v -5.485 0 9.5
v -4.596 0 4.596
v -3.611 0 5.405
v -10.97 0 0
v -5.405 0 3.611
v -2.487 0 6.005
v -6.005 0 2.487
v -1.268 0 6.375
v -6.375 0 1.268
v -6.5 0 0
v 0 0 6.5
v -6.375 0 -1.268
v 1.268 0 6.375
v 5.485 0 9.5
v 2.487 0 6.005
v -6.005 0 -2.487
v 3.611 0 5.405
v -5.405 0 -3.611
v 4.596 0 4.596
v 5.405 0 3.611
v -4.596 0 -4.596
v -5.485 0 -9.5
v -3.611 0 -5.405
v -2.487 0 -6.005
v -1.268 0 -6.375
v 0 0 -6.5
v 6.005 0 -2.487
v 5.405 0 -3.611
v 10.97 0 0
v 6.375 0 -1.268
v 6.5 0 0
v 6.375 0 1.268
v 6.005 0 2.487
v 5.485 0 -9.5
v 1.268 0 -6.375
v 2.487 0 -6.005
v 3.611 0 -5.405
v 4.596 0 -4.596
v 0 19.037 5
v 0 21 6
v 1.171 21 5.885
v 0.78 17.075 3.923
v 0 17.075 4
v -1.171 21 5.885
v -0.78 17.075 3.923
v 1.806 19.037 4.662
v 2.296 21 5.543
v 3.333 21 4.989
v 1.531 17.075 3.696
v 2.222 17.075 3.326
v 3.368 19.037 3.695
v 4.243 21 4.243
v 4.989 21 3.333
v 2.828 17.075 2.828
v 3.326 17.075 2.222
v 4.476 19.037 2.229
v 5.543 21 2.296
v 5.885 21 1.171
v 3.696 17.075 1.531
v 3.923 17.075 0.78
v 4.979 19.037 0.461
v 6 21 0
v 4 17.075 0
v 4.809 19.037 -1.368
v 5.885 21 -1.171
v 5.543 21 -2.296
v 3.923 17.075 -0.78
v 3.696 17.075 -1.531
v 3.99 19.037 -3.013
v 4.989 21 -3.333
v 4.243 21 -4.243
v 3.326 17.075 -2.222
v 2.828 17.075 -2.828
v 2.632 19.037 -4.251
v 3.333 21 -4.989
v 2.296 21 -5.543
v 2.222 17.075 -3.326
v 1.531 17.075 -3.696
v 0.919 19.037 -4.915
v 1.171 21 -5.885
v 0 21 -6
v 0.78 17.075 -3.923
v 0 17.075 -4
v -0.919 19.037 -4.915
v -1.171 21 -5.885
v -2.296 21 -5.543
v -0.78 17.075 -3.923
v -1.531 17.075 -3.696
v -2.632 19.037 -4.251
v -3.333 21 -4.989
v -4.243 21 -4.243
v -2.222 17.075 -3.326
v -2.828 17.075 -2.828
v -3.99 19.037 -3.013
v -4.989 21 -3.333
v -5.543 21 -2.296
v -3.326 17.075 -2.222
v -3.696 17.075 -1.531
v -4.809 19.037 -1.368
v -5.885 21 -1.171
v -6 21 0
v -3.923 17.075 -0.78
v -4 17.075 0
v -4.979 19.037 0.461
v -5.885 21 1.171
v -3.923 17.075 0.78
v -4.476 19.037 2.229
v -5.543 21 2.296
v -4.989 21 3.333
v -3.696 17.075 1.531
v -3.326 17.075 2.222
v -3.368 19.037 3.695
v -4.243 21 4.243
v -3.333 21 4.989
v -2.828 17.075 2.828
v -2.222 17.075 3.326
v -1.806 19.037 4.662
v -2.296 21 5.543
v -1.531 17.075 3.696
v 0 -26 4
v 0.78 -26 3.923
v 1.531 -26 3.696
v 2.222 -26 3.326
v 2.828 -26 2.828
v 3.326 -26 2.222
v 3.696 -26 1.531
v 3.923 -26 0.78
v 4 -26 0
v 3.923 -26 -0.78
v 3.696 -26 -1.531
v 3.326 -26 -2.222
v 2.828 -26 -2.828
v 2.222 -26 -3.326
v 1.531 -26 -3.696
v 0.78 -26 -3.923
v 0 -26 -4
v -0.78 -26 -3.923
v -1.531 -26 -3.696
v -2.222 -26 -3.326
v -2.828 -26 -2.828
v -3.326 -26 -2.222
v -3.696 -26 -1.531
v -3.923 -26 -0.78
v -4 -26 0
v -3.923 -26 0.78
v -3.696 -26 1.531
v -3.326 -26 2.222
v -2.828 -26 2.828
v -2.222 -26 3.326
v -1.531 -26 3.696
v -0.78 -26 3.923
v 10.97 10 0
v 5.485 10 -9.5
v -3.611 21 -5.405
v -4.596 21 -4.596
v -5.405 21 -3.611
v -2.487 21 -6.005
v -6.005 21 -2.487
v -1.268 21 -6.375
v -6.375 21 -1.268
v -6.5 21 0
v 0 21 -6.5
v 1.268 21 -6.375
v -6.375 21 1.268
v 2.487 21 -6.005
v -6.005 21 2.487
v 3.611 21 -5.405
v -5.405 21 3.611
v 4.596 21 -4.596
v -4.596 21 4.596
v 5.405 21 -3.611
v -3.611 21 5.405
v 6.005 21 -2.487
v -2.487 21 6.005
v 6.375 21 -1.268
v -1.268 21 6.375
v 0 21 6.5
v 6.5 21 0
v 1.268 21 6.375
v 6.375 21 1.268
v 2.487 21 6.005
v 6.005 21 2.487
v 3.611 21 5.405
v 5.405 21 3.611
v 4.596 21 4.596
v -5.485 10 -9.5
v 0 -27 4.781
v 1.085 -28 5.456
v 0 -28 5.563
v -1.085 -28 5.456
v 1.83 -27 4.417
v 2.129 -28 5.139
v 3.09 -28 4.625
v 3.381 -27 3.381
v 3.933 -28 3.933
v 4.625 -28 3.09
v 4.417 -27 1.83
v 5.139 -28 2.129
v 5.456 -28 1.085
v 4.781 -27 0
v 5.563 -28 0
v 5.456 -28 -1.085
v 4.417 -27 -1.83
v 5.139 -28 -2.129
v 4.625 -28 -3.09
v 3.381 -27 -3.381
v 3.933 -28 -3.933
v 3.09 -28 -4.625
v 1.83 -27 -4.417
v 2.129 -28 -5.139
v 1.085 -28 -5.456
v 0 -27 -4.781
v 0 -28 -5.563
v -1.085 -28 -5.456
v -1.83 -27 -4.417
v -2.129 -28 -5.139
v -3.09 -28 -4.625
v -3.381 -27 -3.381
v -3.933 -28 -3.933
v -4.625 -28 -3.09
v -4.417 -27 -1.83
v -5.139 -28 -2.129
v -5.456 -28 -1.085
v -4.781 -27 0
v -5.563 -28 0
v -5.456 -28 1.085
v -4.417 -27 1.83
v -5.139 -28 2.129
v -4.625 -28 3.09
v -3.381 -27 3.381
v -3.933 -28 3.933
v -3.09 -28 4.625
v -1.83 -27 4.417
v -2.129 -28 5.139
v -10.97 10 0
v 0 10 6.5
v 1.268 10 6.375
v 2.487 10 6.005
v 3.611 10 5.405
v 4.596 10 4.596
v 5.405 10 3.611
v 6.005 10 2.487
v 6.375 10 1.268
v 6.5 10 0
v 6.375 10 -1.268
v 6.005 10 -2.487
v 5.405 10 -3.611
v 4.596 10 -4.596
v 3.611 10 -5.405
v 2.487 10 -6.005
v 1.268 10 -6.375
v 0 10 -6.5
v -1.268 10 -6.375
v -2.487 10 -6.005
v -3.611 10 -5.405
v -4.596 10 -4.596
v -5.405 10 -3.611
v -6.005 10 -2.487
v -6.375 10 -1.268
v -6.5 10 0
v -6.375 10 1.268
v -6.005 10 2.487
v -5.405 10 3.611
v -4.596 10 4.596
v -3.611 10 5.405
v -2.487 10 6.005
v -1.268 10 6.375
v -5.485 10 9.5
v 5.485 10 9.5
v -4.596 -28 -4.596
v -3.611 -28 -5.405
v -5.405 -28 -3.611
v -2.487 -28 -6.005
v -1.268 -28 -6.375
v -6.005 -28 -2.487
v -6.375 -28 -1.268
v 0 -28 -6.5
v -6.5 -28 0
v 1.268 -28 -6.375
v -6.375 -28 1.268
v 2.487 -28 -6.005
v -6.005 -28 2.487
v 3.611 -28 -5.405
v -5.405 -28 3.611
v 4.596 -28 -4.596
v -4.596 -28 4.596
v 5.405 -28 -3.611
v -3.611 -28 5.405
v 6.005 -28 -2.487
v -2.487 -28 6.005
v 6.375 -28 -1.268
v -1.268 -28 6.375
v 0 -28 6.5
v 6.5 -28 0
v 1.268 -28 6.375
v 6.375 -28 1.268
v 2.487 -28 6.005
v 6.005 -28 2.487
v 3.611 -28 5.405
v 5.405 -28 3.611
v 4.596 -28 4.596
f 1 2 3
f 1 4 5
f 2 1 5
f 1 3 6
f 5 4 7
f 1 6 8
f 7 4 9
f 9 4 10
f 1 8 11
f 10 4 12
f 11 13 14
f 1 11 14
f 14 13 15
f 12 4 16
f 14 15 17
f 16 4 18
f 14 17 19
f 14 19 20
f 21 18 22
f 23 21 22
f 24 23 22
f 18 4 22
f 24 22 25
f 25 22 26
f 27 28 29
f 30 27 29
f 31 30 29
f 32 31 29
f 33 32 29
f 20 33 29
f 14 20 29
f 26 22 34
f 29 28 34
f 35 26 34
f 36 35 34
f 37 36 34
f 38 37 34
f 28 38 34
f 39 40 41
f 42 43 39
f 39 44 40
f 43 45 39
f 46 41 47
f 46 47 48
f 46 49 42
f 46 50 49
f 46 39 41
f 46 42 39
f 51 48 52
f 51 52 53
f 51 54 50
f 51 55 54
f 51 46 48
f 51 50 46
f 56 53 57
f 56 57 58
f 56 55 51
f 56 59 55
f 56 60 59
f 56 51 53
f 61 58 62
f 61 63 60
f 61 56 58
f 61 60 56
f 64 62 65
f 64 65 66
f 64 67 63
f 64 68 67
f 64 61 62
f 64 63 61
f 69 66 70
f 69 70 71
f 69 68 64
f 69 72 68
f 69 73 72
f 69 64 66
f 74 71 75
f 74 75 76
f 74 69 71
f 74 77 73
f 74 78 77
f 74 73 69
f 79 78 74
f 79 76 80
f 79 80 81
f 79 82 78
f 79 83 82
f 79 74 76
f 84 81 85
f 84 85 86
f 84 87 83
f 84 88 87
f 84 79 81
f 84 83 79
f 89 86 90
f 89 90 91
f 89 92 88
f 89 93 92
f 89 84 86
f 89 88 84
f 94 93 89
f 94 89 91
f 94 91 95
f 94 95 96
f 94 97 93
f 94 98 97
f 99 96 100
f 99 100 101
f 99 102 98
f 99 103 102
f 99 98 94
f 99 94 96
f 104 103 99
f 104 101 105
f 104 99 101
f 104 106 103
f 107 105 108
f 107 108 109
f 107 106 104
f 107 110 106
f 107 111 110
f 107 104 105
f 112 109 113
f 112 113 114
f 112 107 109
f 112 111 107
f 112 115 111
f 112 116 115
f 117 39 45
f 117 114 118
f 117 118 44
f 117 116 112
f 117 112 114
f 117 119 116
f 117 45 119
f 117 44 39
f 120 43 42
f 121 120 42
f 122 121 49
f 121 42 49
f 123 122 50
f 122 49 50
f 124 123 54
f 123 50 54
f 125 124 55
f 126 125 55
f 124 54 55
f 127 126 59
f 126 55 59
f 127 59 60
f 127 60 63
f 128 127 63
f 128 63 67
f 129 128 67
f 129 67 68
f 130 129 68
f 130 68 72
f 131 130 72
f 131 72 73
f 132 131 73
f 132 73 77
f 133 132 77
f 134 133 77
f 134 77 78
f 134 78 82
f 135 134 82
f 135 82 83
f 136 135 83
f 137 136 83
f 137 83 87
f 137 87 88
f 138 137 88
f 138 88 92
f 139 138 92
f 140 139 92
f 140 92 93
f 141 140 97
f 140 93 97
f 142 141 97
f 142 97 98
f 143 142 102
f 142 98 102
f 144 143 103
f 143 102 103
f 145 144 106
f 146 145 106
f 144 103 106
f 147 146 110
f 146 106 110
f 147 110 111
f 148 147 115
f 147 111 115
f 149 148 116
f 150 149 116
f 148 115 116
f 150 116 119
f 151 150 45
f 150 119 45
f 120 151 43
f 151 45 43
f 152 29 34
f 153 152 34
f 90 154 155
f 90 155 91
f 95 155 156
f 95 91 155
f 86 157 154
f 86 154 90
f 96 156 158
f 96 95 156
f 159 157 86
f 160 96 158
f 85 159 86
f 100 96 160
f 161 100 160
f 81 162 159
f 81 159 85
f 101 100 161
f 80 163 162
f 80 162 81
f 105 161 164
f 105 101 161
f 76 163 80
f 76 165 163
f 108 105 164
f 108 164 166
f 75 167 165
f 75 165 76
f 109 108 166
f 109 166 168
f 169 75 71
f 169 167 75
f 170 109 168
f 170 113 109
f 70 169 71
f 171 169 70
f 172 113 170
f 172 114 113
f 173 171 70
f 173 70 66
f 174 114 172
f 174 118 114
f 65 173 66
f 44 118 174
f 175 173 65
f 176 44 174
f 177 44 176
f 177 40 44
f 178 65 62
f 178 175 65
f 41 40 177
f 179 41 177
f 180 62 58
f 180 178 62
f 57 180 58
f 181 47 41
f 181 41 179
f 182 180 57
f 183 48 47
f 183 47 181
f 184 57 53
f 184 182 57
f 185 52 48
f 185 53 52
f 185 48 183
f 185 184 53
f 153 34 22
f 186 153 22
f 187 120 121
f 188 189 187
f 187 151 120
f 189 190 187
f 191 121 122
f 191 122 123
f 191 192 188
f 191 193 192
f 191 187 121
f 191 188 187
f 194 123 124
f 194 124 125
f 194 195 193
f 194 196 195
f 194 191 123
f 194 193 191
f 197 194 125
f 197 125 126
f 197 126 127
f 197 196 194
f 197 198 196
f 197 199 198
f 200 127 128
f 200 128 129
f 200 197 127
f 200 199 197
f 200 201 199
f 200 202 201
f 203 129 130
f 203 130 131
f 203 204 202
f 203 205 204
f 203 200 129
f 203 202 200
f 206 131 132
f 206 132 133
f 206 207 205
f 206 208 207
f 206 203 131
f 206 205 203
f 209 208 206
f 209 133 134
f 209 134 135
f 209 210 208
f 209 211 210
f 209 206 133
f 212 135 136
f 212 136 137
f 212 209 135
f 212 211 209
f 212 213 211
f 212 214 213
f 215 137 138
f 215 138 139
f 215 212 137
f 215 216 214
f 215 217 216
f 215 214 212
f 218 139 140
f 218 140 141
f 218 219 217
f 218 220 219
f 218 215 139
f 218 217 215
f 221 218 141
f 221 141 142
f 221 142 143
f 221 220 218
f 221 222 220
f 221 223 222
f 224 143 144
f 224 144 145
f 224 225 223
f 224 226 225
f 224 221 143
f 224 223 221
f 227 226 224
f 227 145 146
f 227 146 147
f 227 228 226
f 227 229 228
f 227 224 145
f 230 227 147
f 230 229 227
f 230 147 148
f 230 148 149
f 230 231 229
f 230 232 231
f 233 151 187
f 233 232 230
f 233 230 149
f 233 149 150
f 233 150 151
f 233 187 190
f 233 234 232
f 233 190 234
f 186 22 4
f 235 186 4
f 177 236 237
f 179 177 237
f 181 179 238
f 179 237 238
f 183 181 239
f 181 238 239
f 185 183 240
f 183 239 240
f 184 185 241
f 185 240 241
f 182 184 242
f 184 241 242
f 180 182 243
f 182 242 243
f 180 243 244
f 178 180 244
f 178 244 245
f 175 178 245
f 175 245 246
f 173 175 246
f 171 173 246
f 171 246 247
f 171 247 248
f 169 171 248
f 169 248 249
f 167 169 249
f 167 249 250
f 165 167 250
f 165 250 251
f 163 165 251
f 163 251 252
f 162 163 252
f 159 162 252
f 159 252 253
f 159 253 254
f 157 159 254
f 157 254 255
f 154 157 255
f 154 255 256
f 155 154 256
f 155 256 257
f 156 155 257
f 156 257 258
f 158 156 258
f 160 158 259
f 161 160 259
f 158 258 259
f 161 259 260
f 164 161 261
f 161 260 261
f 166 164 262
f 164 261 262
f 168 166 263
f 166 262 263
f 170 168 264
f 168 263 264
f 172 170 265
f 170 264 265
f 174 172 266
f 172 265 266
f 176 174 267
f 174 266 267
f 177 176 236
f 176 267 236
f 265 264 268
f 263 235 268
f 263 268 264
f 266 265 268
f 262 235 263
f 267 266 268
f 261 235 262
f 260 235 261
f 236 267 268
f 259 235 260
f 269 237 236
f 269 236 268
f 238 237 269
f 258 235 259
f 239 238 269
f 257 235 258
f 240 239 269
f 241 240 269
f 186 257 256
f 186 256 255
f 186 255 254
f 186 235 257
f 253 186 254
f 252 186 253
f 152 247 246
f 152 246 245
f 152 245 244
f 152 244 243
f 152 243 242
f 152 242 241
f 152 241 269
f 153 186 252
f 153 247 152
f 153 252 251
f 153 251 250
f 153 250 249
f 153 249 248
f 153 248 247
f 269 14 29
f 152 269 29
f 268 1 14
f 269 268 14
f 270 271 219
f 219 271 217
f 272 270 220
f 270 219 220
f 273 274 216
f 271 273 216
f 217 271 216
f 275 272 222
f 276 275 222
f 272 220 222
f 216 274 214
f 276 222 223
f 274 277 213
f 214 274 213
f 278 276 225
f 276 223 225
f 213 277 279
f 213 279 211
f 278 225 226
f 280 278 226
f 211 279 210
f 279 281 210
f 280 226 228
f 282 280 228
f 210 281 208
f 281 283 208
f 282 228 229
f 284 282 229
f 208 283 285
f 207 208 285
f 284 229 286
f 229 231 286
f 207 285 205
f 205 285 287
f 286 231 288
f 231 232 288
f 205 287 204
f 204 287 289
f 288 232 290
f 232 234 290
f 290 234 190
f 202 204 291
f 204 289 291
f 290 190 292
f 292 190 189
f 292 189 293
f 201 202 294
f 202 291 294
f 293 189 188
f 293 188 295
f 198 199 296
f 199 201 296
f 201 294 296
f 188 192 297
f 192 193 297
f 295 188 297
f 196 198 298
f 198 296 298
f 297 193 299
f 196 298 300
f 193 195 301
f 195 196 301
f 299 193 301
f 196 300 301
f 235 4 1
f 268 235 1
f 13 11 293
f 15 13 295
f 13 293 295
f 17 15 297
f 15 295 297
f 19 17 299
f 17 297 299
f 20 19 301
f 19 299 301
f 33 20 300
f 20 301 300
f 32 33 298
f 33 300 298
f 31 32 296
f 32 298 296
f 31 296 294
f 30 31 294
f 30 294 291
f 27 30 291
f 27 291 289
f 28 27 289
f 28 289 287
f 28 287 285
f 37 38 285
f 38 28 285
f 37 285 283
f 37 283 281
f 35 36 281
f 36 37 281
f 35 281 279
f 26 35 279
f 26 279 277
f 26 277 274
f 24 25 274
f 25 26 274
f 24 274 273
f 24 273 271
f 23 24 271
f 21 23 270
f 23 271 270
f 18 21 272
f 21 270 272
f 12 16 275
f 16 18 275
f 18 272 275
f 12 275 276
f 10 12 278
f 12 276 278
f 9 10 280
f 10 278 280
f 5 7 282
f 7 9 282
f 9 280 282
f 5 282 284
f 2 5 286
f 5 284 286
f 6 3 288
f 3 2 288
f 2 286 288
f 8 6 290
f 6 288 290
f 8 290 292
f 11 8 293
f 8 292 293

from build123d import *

# Parameters (mm, degrees)
BOSS_EXTRUDE1_DEPTH      = 10
BOSS_EXTRUDE2_DEPTH      = 11
BOSS_EXTRUDE2_DEPTH_BACK = 38
SKETCH2_R                = 6.5
SKETCH3_R                = 4
CUT_EXTRUDE1_DEPTH       = 57
CHAMFER1_SIZE            = 2
CHAMFER1_SIZE2           = 3.925221011
CHAMFER2_SIZE            = 2
CHAMFER2_SIZE2           = 1.562571253


with BuildPart() as part:
    # Sketch1 → Boss-Extrude1 (new body)
    with BuildSketch(Plane(origin=(0, 0, 0), x_dir=(1, 0, 0), z_dir=(0, 1, 0))):
        Polygon((10.969655115, 0), (5.484827557, 9.5), (-5.484827557, 9.5), (-10.969655115, 0), (-5.484827557, -9.5), (5.484827557, -9.5), align=None)
    extrude(amount=BOSS_EXTRUDE1_DEPTH)

    # Sketch2 → Boss-Extrude2 (add, two sides: drawn at the far end of the back side and taken through both)
    with BuildSketch(Plane(origin=(0, 10, 0), x_dir=(1, 0, 0), z_dir=(0, 1, 0)).offset(-BOSS_EXTRUDE2_DEPTH_BACK)):
        with Locations(Location((0, 0, 0), (0, 0, 270))):
            Circle(SKETCH2_R)
    extrude(amount=BOSS_EXTRUDE2_DEPTH + BOSS_EXTRUDE2_DEPTH_BACK)

    # Sketch3 → Cut-Extrude1 (cut)
    with BuildSketch(Plane(origin=(0, 21, 0), x_dir=(1, 0, 0), z_dir=(0, 1, 0))):
        with Locations(Location((0, 0, 0), (0, 0, 270))):
            Circle(SKETCH3_R)
    extrude(amount=-CUT_EXTRUDE1_DEPTH, mode=Mode.SUBTRACT)

    # Chamfer1
    chamfer1_edges = [part.edges().sort_by_distance(p)[0] for p in [
        (0, 21, -4),
    ]]
    chamfer1_side = [part.faces().sort_by_distance(p)[0] for p in [
        (0, 21, -6.316152237),
    ]]
    chamfer(chamfer1_edges, length=CHAMFER1_SIZE, length2=CHAMFER1_SIZE2, reference=chamfer1_side[0])

    # Chamfer2
    chamfer2_edges = [part.edges().sort_by_distance(p)[0] for p in [
        (0, -28, -4),
    ]]
    chamfer2_side = [part.faces().sort_by_distance(p)[0] for p in [
        (0, -5.462610506, -4),
    ]]
    chamfer(chamfer2_edges, length=CHAMFER2_SIZE, length2=CHAMFER2_SIZE2, reference=chamfer2_side[0])


solid = part.part
